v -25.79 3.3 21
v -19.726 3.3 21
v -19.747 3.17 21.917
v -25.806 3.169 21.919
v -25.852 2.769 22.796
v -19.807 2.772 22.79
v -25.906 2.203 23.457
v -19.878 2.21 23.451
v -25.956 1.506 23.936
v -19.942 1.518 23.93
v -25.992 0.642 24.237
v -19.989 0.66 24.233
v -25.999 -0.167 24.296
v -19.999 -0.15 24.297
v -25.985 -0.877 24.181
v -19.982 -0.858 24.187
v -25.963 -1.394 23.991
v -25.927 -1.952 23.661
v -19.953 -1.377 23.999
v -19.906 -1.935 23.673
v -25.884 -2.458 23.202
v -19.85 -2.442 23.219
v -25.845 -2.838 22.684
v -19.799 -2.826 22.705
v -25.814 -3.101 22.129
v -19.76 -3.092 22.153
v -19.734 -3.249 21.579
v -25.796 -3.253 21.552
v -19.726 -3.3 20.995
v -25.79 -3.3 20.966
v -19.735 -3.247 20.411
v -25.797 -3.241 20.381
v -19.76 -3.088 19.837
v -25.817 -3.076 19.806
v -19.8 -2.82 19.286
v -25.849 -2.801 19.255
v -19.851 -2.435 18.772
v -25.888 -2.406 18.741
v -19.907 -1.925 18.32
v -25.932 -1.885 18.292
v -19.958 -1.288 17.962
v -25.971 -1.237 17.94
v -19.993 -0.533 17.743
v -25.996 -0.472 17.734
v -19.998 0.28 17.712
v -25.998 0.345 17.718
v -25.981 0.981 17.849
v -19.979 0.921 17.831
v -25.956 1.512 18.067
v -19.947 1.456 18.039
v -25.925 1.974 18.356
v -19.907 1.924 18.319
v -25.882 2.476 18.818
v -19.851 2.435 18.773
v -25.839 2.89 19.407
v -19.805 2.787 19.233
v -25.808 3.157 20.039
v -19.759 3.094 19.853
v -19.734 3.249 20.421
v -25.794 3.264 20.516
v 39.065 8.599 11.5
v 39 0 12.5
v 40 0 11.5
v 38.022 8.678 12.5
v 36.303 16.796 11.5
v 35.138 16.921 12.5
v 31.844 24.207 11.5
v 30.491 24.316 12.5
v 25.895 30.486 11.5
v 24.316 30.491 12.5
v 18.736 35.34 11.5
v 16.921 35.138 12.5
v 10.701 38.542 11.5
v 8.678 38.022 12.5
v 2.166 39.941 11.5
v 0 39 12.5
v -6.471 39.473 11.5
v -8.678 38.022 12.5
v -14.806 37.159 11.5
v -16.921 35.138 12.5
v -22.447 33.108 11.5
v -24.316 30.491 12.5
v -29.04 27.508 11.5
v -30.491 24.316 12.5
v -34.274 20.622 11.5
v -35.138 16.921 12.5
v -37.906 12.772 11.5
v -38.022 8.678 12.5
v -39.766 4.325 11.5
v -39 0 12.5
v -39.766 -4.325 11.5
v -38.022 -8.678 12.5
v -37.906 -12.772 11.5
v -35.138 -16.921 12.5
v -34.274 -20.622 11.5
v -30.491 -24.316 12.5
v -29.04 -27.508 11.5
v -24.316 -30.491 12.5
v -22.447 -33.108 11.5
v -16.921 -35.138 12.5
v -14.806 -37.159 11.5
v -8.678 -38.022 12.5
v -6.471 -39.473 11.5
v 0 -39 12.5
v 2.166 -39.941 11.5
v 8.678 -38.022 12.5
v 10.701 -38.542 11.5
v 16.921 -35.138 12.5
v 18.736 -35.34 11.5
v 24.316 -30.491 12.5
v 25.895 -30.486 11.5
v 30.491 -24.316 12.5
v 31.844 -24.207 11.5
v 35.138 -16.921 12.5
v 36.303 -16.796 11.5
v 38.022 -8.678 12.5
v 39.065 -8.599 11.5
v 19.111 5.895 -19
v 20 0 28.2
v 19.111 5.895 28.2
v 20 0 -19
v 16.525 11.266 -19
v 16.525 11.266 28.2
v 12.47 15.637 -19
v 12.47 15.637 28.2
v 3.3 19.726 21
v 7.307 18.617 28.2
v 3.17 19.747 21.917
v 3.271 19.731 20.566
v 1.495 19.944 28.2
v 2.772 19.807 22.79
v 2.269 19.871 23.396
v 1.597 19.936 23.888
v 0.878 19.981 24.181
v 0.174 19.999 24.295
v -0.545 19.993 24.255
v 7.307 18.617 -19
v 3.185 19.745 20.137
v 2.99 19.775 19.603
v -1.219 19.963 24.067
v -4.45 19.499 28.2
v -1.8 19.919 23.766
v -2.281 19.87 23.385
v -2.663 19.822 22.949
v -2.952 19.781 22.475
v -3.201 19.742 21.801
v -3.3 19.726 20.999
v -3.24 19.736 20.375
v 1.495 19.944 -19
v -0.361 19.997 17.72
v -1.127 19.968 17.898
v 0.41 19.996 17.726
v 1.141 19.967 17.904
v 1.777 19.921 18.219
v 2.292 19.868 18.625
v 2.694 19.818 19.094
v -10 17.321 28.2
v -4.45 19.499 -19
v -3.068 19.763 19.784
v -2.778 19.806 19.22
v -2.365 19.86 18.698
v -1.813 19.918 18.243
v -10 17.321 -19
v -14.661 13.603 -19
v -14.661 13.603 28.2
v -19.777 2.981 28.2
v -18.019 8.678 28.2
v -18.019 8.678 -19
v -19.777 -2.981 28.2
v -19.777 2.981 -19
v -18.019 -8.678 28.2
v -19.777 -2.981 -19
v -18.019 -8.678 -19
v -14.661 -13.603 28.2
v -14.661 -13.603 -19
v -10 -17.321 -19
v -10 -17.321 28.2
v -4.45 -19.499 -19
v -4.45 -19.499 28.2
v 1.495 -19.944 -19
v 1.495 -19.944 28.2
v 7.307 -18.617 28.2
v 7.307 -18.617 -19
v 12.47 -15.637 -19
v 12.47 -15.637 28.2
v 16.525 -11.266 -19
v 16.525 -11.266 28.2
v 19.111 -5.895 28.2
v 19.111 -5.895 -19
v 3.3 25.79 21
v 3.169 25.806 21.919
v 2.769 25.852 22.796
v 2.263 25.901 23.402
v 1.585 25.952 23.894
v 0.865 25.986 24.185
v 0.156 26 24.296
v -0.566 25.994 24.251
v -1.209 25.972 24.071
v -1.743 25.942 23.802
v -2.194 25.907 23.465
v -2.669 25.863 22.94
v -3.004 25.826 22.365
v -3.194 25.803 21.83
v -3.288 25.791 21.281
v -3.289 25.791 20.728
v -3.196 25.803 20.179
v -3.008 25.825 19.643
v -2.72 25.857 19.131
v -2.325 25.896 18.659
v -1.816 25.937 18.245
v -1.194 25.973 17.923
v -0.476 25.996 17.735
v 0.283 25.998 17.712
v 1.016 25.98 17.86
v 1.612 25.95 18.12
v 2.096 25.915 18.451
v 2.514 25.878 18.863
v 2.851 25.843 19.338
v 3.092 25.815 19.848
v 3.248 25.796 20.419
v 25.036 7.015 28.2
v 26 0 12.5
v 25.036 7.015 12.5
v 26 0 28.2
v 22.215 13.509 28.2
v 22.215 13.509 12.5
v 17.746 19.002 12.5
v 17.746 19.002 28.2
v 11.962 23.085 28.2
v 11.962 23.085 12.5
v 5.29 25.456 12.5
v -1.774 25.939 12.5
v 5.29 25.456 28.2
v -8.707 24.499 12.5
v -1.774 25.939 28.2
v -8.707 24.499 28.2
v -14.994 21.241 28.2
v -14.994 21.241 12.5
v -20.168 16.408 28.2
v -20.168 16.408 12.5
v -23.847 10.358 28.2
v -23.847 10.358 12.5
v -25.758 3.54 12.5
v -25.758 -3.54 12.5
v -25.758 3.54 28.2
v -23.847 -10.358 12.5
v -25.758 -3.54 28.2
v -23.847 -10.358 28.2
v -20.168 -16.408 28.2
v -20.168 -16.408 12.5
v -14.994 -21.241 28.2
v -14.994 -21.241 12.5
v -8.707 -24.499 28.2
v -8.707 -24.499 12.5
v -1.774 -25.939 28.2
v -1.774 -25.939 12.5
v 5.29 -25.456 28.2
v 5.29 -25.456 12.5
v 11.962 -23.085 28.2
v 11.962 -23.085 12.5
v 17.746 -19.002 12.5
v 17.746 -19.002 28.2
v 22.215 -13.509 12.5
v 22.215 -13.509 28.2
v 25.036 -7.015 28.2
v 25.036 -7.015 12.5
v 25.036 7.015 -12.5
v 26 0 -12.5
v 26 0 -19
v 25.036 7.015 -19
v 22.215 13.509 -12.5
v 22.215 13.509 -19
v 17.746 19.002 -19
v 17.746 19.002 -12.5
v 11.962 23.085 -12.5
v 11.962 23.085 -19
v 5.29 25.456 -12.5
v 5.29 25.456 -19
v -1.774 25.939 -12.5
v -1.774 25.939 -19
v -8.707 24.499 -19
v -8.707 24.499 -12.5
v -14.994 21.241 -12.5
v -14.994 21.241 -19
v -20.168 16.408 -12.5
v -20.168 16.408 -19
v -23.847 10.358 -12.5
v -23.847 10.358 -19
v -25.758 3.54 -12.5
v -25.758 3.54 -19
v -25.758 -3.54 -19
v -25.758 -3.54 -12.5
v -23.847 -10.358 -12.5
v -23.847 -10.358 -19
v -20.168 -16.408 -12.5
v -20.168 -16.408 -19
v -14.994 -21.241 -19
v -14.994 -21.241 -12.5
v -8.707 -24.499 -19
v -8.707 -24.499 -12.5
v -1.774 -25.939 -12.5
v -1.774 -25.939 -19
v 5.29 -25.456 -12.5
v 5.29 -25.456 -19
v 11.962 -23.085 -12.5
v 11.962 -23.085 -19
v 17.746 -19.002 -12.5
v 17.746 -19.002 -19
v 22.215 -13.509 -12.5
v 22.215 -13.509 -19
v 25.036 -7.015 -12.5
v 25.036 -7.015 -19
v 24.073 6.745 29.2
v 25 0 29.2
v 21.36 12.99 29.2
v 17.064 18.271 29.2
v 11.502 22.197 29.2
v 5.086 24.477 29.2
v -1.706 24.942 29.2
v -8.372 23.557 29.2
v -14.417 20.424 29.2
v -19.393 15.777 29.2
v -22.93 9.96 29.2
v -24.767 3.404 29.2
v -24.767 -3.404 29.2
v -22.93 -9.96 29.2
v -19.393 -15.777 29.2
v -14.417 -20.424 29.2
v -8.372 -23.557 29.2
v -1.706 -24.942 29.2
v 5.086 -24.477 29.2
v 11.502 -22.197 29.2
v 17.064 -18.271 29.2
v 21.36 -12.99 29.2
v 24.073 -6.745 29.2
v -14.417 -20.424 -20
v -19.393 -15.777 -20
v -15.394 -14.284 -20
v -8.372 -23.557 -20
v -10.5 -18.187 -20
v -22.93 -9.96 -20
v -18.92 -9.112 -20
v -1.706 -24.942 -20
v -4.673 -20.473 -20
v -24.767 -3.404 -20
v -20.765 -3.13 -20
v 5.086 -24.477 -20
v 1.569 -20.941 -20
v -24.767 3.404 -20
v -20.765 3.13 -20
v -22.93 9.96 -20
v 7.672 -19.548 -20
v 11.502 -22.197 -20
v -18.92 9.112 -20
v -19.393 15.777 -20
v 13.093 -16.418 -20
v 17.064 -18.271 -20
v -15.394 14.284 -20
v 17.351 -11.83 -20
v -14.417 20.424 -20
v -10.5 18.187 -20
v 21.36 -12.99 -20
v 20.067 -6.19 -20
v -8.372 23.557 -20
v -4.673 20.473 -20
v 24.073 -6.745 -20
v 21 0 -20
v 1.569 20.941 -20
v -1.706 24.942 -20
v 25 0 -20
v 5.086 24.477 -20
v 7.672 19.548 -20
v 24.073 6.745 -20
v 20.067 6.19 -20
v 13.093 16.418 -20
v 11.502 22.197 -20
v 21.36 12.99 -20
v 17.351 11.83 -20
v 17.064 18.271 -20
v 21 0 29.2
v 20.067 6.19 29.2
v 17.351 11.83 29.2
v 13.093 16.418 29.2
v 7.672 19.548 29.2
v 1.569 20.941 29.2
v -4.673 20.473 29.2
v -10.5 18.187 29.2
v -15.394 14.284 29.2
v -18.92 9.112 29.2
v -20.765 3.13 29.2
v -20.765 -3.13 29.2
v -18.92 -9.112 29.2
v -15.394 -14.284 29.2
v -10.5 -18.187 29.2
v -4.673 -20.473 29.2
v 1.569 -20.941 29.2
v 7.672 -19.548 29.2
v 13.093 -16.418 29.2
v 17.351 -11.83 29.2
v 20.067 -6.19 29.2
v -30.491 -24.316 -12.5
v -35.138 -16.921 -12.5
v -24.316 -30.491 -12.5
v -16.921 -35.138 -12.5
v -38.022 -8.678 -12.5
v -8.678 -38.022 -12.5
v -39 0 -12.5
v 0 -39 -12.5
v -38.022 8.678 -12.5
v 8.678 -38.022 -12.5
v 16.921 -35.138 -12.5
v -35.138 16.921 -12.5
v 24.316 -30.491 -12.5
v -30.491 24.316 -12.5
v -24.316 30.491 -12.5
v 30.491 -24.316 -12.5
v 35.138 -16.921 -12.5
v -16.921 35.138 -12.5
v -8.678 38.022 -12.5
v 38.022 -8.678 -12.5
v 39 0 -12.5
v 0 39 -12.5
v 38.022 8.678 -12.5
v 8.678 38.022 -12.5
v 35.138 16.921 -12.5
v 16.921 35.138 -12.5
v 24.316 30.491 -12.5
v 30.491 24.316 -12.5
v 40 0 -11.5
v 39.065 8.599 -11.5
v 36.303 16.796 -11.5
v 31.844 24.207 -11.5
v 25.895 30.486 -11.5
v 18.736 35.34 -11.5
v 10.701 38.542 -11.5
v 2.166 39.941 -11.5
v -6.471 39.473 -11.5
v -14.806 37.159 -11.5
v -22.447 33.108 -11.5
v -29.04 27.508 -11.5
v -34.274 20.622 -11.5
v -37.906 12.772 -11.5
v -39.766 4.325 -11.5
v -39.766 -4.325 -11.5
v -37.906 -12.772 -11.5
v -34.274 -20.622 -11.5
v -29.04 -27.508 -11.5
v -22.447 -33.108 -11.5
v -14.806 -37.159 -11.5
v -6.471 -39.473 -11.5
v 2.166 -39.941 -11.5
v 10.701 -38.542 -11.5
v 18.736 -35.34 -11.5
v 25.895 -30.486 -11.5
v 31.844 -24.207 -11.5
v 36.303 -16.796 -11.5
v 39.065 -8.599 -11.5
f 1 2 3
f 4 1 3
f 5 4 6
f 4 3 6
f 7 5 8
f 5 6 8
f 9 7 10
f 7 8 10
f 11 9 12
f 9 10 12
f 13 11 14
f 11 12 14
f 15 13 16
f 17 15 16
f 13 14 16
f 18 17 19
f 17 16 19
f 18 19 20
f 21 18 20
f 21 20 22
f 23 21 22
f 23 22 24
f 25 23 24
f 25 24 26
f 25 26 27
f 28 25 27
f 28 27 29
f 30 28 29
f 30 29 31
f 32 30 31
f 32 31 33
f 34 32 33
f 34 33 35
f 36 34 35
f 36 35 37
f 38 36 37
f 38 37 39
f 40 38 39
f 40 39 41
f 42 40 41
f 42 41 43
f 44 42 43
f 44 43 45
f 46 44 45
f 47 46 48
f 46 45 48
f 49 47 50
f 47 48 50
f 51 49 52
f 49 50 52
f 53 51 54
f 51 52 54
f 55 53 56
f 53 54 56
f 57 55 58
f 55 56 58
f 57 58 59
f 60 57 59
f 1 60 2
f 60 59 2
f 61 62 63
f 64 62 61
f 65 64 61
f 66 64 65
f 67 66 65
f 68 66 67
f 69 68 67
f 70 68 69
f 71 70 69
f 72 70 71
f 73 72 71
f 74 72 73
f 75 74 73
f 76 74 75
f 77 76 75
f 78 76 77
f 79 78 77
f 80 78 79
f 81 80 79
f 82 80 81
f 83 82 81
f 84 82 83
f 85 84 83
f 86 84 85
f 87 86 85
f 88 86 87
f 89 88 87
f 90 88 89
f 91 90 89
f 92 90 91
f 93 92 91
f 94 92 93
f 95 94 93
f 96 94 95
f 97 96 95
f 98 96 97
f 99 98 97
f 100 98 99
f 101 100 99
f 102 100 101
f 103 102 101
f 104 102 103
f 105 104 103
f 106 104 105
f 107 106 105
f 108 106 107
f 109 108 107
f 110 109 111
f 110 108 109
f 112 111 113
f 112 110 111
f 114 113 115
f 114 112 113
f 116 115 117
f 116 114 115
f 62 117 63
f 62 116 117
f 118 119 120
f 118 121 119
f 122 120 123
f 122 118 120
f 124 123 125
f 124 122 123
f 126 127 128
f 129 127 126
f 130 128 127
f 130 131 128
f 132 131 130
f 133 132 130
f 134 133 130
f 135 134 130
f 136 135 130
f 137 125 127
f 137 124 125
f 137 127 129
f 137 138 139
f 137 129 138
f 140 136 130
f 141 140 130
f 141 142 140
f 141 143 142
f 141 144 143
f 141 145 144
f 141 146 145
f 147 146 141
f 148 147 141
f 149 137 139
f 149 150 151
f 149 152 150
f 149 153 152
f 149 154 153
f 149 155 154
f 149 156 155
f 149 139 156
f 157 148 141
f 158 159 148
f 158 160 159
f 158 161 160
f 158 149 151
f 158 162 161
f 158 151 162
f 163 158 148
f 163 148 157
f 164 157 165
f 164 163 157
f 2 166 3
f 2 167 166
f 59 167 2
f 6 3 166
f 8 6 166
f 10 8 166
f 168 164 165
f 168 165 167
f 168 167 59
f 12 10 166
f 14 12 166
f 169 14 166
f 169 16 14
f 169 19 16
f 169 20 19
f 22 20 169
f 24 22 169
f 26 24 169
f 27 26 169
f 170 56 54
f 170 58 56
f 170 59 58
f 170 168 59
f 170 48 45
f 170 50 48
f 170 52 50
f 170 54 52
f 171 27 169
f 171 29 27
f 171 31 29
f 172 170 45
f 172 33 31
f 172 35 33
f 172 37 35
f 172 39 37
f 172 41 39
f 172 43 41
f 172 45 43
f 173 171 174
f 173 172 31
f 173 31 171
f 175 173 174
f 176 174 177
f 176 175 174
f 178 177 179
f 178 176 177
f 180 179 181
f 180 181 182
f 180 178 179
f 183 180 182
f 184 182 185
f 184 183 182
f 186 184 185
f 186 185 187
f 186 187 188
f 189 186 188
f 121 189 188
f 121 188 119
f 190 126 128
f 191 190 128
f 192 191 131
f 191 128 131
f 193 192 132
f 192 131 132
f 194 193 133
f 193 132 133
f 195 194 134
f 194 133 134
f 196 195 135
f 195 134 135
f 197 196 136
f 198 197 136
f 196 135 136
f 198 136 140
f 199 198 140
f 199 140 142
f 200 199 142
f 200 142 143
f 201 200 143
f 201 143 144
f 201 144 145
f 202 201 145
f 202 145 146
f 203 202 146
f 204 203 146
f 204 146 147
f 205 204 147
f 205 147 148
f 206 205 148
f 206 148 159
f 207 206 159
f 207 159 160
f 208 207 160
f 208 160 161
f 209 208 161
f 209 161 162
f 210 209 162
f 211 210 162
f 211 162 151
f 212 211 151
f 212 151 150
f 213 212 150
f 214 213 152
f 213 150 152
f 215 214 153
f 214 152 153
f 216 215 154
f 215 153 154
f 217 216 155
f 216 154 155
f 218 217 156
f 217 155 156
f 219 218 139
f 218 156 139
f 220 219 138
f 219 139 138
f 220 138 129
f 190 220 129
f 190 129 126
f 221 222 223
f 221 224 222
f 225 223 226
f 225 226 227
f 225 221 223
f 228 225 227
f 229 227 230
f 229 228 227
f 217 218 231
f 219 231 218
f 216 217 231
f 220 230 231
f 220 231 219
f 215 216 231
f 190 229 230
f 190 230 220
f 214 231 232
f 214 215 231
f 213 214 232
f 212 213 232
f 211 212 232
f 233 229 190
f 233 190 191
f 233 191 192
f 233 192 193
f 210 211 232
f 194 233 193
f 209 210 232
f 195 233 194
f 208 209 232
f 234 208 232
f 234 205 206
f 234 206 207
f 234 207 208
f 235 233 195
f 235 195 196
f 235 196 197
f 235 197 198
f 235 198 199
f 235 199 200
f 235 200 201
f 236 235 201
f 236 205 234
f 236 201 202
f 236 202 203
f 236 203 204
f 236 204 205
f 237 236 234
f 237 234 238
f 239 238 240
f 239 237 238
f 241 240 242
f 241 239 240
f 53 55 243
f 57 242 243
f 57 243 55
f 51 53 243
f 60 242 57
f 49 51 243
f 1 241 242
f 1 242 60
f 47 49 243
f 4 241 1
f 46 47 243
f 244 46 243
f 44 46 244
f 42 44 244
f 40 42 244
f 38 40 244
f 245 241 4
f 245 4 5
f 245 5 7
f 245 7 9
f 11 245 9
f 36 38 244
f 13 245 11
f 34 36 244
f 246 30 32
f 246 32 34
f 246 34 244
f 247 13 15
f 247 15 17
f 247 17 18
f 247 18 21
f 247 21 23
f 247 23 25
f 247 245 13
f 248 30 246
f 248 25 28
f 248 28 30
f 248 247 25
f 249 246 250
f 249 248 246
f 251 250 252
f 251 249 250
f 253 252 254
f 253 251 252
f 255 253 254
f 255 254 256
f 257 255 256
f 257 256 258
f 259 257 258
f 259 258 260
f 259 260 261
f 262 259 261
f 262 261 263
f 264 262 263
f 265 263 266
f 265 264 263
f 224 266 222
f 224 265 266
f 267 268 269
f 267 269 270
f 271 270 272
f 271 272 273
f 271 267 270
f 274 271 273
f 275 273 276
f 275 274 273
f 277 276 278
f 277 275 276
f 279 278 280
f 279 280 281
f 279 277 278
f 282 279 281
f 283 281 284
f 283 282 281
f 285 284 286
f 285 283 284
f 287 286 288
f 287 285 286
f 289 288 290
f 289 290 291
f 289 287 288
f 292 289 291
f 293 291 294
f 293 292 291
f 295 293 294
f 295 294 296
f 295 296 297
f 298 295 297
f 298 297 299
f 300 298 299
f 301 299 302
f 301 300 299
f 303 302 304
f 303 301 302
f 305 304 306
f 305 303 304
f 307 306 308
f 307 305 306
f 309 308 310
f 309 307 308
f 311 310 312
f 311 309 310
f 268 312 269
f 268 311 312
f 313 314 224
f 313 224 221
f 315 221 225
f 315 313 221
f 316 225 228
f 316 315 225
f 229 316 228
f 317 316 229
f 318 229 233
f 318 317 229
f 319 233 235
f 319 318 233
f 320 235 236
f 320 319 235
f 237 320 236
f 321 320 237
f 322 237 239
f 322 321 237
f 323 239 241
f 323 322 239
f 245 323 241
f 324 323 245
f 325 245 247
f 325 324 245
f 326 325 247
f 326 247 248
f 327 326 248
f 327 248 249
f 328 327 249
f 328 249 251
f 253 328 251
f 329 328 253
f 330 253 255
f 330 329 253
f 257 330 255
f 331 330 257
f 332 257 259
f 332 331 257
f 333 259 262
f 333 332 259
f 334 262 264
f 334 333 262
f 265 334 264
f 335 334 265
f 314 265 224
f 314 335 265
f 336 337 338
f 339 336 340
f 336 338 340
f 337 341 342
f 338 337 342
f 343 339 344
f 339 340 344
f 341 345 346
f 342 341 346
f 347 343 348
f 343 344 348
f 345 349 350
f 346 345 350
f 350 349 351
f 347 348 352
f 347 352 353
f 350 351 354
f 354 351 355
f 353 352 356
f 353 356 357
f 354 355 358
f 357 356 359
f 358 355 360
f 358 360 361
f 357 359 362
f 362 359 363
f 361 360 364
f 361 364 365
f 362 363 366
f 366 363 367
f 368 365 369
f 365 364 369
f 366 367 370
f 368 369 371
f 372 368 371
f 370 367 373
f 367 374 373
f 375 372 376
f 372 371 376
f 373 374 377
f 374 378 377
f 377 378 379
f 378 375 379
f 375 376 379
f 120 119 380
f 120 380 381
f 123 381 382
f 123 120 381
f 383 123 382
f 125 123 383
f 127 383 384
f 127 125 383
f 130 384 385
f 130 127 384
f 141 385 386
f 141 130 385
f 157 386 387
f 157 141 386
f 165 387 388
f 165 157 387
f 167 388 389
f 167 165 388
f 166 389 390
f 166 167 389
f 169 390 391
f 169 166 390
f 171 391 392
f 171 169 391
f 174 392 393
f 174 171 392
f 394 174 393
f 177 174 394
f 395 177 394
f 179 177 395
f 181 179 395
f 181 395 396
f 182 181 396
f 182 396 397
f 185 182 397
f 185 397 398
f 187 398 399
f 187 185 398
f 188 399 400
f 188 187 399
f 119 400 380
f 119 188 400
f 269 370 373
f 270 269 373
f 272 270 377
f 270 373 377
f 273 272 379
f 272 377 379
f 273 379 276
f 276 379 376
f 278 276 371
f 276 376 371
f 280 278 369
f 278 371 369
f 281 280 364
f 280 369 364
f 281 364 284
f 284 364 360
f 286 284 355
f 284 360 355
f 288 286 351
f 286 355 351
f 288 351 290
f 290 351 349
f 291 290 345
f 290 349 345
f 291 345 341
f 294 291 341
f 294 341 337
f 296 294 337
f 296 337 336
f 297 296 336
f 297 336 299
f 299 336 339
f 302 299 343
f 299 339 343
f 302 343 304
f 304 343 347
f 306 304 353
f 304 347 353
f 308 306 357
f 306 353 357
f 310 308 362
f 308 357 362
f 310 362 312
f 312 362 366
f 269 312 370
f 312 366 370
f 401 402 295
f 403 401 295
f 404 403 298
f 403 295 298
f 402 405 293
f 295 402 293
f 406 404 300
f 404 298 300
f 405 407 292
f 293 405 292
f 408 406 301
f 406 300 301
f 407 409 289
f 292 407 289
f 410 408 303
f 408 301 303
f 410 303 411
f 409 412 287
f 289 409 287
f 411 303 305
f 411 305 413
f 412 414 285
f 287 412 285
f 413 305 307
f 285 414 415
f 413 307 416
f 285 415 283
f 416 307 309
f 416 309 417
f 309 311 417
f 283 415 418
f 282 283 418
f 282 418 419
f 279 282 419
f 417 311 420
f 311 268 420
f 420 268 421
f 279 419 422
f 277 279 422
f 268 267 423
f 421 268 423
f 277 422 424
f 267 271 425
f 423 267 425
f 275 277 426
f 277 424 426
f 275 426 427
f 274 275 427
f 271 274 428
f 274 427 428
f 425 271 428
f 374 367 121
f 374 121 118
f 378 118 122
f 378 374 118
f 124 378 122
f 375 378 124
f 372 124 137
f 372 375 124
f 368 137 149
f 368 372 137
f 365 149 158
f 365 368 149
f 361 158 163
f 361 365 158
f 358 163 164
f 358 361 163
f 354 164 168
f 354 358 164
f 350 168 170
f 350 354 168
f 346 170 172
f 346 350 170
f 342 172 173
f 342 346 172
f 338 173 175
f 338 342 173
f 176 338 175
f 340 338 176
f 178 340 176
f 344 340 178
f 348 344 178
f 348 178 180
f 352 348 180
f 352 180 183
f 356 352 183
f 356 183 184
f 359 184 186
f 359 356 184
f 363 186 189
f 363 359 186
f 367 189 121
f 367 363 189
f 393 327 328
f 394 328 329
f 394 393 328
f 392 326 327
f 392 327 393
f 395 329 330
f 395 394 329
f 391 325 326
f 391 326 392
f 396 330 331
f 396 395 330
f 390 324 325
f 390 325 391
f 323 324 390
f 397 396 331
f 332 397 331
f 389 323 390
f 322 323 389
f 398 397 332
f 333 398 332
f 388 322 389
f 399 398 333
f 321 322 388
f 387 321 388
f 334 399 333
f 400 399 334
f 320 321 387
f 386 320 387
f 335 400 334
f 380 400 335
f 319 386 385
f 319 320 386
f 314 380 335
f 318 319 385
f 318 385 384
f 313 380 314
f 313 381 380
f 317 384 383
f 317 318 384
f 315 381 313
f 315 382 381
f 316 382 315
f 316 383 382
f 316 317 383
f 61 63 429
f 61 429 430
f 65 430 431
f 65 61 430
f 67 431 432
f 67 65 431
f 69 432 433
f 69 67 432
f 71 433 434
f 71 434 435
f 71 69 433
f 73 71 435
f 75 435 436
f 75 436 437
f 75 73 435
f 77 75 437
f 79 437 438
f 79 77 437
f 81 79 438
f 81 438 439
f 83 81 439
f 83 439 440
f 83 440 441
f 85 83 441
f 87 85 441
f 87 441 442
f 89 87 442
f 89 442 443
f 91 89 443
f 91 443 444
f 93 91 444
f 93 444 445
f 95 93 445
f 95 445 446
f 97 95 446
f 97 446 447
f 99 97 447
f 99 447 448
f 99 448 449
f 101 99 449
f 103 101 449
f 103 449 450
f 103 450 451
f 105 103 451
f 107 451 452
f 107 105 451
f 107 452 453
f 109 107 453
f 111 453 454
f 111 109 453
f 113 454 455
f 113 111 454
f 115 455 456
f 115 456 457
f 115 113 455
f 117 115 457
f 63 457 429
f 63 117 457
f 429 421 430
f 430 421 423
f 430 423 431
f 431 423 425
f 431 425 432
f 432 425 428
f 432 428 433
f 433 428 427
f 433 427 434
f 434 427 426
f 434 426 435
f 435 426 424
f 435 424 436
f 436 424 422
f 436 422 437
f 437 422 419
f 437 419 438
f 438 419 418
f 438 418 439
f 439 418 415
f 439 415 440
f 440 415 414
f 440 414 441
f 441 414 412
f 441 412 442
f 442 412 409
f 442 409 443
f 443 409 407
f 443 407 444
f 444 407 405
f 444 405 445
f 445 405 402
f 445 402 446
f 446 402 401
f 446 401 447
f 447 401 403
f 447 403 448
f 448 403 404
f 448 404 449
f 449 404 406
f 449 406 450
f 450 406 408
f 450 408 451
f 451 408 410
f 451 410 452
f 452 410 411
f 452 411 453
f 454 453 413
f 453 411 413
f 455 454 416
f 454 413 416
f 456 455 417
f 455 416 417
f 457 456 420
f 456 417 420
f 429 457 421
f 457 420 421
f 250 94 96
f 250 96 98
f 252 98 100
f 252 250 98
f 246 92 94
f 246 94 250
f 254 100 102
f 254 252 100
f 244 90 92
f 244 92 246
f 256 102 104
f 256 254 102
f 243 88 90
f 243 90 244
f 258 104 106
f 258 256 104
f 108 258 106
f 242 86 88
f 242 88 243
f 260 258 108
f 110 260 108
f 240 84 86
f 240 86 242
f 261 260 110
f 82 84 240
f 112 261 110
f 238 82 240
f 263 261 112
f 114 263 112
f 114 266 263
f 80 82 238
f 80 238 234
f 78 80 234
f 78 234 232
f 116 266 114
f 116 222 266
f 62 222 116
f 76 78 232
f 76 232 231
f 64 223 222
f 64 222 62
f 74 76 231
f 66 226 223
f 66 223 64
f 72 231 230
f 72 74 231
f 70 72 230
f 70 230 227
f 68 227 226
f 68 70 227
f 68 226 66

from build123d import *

# Parameters (mm, degrees)
F0_R          = 26
F0_R_2        = 20
F1_DEPTH      = 29.2
F1_DEPTH_BACK = 20
F2_SIZE       = 1
F4_D          = 6.6
F4_DEPTH      = 26.001
F6_D          = 6.6
F6_DEPTH      = 26.0010001
F7_R          = 40
F8_DEPTH      = 12.5
F8_DEPTH_BACK = 12.5
F9_DEPTH      = 25
F10_SIZE      = 1


with BuildPart() as f1:
    # F0 (on Top) → F1 (new body, two sides)
    with BuildSketch(Plane.XY) as f1_sk:
        Circle(F0_R)
        Circle(F0_R_2, mode=Mode.SUBTRACT)
    extrude(amount=F1_DEPTH)
    extrude(f1_sk.sketch, amount=-F1_DEPTH_BACK)

    # F2
    f2_edges = [f1.edges().sort_by_distance(p)[0] for p in [
        (-20, 0, 29.2),
        (-26, 0, 29.2),
        (-20, 0, -20),
        (-26, 0, -20),
    ]]
    chamfer(f2_edges, length=F2_SIZE)

    # F4 (through all, one way)
    with BuildSketch(Plane.XZ):
        with Locations((0, 21)):
            Circle(F4_D / 2)
    extrude(amount=-F4_DEPTH, mode=Mode.SUBTRACT)

    # F6 (through all, one way)
    with BuildSketch(Plane.YZ):
        with Locations((0, 21)):
            Circle(F6_D / 2)
    extrude(amount=-F6_DEPTH, mode=Mode.SUBTRACT)

    # F7 (on Top) → F8 (join, two sides)
    with BuildSketch(Plane.XY) as f8_sk:
        Circle(F7_R)
    extrude(amount=F8_DEPTH)
    extrude(f8_sk.sketch, amount=-F8_DEPTH_BACK)

    # F9 (cut): a face of the model
    f9_faces = [f1.faces().sort_by_distance(p)[0] for p in [
        (0, 0, 12.5),
    ]]
    extrude(f9_faces, amount=-F9_DEPTH, mode=Mode.SUBTRACT)

    # F10
    f10_edges = [f1.edges().sort_by_distance(p)[0] for p in [
        (-40, 0, 12.5),
        (-40, 0, -12.5),
    ]]
    chamfer(f10_edges, length=F10_SIZE)


solid = f1.part
